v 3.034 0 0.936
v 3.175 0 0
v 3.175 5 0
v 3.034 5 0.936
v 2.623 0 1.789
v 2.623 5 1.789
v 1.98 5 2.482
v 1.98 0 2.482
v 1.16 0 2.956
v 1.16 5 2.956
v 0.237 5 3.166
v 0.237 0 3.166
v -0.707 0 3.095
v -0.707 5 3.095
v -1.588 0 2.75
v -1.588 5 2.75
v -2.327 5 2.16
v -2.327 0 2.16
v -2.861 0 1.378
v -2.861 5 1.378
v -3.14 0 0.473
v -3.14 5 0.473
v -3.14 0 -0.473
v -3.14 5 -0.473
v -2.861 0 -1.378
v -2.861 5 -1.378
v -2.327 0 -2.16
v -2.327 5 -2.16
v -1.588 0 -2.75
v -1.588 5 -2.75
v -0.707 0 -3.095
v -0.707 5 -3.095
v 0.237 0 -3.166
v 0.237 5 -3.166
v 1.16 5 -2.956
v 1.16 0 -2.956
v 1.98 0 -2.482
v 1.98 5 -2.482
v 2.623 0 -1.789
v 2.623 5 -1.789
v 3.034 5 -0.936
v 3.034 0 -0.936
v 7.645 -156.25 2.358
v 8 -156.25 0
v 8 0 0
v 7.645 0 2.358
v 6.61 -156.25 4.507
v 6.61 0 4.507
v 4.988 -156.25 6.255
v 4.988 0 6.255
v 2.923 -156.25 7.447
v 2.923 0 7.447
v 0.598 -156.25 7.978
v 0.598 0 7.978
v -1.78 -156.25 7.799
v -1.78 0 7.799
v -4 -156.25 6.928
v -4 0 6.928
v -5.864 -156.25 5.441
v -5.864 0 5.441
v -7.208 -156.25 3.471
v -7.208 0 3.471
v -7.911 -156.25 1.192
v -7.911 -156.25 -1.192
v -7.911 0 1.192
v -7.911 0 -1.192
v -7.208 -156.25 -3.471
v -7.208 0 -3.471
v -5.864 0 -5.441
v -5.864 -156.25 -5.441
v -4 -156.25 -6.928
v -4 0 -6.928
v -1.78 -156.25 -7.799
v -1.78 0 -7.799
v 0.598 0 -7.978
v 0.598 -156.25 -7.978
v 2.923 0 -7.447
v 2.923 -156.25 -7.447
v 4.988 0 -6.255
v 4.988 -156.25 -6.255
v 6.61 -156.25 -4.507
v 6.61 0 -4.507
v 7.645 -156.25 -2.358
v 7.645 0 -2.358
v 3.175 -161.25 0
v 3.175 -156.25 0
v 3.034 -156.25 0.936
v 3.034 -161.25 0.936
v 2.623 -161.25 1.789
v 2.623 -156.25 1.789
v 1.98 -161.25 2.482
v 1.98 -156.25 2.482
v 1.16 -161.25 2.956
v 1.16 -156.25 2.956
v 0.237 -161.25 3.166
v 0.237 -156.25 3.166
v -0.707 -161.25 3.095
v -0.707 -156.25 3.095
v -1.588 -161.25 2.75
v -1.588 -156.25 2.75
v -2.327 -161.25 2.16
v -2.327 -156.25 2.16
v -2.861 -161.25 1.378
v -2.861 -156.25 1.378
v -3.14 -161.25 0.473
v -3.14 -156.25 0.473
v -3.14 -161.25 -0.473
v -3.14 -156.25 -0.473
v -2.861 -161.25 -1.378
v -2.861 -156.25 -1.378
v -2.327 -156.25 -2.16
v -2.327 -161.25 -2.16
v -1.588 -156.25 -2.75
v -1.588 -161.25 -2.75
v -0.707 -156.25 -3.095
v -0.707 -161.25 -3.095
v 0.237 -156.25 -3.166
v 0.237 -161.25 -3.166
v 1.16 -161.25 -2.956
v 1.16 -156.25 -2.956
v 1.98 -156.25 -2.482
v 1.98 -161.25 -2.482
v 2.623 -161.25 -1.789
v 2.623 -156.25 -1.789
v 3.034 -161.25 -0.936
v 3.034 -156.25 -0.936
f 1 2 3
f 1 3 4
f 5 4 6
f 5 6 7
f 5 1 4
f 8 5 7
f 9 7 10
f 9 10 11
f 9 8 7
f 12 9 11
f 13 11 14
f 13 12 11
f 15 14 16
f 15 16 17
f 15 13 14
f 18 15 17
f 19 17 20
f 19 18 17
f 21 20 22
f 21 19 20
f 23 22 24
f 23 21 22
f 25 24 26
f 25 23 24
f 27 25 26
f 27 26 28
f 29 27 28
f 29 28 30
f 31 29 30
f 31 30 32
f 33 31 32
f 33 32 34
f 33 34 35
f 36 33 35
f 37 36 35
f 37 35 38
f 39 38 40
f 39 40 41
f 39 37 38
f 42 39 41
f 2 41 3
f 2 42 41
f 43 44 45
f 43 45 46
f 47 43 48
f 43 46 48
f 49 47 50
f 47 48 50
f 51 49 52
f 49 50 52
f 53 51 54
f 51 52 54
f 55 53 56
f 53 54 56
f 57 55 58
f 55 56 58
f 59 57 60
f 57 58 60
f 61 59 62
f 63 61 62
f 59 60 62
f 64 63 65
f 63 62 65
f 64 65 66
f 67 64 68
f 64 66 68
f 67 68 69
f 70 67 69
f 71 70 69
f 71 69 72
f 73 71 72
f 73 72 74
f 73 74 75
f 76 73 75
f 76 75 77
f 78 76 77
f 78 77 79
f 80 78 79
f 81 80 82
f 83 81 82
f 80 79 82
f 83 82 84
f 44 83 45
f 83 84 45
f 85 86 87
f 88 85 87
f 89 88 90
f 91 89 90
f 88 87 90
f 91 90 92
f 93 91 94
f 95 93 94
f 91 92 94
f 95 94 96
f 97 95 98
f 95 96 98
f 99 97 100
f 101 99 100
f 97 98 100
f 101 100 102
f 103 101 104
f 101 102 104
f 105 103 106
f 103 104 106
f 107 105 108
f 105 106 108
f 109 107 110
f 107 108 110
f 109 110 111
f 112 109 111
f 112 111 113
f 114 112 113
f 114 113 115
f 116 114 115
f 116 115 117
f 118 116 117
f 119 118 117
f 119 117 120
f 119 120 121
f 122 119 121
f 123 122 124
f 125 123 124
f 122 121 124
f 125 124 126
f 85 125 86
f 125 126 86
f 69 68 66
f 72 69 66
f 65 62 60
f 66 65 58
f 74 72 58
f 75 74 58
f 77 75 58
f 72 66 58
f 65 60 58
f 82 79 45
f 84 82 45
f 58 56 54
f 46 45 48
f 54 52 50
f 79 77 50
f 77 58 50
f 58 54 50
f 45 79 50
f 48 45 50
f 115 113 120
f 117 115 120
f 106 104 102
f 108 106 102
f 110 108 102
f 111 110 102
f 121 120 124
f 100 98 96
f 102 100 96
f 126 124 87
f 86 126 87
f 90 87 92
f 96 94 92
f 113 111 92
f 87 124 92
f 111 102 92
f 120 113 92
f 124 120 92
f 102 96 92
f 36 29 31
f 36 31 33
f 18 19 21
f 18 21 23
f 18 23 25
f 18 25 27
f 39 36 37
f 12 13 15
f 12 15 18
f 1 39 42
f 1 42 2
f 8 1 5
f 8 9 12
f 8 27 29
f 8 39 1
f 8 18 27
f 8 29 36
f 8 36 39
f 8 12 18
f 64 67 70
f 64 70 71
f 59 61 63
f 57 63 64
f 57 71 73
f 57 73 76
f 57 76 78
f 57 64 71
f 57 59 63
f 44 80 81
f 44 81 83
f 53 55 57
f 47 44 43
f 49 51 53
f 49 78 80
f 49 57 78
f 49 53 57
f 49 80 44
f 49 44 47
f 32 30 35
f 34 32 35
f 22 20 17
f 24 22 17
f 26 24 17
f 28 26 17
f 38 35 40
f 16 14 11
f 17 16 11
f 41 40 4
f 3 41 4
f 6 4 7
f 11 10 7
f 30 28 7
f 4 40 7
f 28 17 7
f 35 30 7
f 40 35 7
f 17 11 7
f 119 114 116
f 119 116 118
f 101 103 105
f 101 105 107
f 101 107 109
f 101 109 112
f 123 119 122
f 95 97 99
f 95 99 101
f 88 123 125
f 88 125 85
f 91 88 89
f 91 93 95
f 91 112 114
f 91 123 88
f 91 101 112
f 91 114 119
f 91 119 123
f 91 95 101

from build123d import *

# Parameters (mm, degrees)
F0_R     = 8
F1_DEPTH = 156.25
F2_R     = 3.175
F3_DEPTH = 5


# Not quite as in the source:
# - a pattern or mirror of a feature is missing from the dataset's text; its kind, count and spacing are read off the source's solid


with BuildPart() as f1:
    # F0 (on Front) → F1 (new body)
    with BuildSketch(Plane.XZ):
        Circle(F0_R)
    extrude(amount=F1_DEPTH)


with BuildPart() as f3:
    # F2 (on face) → F3 (new body)
    with BuildSketch(Plane.XZ.offset(156.25)):
        Circle(F2_R)
    extrude(amount=F3_DEPTH)


with BuildPart() as f3_copies_1:
    # F3_copies: instance of F3
    add(f3.part.mirror(Plane.ZX.offset(-78.125)))


solid = Compound([f1.part, f3.part, f3_copies_1.part])
